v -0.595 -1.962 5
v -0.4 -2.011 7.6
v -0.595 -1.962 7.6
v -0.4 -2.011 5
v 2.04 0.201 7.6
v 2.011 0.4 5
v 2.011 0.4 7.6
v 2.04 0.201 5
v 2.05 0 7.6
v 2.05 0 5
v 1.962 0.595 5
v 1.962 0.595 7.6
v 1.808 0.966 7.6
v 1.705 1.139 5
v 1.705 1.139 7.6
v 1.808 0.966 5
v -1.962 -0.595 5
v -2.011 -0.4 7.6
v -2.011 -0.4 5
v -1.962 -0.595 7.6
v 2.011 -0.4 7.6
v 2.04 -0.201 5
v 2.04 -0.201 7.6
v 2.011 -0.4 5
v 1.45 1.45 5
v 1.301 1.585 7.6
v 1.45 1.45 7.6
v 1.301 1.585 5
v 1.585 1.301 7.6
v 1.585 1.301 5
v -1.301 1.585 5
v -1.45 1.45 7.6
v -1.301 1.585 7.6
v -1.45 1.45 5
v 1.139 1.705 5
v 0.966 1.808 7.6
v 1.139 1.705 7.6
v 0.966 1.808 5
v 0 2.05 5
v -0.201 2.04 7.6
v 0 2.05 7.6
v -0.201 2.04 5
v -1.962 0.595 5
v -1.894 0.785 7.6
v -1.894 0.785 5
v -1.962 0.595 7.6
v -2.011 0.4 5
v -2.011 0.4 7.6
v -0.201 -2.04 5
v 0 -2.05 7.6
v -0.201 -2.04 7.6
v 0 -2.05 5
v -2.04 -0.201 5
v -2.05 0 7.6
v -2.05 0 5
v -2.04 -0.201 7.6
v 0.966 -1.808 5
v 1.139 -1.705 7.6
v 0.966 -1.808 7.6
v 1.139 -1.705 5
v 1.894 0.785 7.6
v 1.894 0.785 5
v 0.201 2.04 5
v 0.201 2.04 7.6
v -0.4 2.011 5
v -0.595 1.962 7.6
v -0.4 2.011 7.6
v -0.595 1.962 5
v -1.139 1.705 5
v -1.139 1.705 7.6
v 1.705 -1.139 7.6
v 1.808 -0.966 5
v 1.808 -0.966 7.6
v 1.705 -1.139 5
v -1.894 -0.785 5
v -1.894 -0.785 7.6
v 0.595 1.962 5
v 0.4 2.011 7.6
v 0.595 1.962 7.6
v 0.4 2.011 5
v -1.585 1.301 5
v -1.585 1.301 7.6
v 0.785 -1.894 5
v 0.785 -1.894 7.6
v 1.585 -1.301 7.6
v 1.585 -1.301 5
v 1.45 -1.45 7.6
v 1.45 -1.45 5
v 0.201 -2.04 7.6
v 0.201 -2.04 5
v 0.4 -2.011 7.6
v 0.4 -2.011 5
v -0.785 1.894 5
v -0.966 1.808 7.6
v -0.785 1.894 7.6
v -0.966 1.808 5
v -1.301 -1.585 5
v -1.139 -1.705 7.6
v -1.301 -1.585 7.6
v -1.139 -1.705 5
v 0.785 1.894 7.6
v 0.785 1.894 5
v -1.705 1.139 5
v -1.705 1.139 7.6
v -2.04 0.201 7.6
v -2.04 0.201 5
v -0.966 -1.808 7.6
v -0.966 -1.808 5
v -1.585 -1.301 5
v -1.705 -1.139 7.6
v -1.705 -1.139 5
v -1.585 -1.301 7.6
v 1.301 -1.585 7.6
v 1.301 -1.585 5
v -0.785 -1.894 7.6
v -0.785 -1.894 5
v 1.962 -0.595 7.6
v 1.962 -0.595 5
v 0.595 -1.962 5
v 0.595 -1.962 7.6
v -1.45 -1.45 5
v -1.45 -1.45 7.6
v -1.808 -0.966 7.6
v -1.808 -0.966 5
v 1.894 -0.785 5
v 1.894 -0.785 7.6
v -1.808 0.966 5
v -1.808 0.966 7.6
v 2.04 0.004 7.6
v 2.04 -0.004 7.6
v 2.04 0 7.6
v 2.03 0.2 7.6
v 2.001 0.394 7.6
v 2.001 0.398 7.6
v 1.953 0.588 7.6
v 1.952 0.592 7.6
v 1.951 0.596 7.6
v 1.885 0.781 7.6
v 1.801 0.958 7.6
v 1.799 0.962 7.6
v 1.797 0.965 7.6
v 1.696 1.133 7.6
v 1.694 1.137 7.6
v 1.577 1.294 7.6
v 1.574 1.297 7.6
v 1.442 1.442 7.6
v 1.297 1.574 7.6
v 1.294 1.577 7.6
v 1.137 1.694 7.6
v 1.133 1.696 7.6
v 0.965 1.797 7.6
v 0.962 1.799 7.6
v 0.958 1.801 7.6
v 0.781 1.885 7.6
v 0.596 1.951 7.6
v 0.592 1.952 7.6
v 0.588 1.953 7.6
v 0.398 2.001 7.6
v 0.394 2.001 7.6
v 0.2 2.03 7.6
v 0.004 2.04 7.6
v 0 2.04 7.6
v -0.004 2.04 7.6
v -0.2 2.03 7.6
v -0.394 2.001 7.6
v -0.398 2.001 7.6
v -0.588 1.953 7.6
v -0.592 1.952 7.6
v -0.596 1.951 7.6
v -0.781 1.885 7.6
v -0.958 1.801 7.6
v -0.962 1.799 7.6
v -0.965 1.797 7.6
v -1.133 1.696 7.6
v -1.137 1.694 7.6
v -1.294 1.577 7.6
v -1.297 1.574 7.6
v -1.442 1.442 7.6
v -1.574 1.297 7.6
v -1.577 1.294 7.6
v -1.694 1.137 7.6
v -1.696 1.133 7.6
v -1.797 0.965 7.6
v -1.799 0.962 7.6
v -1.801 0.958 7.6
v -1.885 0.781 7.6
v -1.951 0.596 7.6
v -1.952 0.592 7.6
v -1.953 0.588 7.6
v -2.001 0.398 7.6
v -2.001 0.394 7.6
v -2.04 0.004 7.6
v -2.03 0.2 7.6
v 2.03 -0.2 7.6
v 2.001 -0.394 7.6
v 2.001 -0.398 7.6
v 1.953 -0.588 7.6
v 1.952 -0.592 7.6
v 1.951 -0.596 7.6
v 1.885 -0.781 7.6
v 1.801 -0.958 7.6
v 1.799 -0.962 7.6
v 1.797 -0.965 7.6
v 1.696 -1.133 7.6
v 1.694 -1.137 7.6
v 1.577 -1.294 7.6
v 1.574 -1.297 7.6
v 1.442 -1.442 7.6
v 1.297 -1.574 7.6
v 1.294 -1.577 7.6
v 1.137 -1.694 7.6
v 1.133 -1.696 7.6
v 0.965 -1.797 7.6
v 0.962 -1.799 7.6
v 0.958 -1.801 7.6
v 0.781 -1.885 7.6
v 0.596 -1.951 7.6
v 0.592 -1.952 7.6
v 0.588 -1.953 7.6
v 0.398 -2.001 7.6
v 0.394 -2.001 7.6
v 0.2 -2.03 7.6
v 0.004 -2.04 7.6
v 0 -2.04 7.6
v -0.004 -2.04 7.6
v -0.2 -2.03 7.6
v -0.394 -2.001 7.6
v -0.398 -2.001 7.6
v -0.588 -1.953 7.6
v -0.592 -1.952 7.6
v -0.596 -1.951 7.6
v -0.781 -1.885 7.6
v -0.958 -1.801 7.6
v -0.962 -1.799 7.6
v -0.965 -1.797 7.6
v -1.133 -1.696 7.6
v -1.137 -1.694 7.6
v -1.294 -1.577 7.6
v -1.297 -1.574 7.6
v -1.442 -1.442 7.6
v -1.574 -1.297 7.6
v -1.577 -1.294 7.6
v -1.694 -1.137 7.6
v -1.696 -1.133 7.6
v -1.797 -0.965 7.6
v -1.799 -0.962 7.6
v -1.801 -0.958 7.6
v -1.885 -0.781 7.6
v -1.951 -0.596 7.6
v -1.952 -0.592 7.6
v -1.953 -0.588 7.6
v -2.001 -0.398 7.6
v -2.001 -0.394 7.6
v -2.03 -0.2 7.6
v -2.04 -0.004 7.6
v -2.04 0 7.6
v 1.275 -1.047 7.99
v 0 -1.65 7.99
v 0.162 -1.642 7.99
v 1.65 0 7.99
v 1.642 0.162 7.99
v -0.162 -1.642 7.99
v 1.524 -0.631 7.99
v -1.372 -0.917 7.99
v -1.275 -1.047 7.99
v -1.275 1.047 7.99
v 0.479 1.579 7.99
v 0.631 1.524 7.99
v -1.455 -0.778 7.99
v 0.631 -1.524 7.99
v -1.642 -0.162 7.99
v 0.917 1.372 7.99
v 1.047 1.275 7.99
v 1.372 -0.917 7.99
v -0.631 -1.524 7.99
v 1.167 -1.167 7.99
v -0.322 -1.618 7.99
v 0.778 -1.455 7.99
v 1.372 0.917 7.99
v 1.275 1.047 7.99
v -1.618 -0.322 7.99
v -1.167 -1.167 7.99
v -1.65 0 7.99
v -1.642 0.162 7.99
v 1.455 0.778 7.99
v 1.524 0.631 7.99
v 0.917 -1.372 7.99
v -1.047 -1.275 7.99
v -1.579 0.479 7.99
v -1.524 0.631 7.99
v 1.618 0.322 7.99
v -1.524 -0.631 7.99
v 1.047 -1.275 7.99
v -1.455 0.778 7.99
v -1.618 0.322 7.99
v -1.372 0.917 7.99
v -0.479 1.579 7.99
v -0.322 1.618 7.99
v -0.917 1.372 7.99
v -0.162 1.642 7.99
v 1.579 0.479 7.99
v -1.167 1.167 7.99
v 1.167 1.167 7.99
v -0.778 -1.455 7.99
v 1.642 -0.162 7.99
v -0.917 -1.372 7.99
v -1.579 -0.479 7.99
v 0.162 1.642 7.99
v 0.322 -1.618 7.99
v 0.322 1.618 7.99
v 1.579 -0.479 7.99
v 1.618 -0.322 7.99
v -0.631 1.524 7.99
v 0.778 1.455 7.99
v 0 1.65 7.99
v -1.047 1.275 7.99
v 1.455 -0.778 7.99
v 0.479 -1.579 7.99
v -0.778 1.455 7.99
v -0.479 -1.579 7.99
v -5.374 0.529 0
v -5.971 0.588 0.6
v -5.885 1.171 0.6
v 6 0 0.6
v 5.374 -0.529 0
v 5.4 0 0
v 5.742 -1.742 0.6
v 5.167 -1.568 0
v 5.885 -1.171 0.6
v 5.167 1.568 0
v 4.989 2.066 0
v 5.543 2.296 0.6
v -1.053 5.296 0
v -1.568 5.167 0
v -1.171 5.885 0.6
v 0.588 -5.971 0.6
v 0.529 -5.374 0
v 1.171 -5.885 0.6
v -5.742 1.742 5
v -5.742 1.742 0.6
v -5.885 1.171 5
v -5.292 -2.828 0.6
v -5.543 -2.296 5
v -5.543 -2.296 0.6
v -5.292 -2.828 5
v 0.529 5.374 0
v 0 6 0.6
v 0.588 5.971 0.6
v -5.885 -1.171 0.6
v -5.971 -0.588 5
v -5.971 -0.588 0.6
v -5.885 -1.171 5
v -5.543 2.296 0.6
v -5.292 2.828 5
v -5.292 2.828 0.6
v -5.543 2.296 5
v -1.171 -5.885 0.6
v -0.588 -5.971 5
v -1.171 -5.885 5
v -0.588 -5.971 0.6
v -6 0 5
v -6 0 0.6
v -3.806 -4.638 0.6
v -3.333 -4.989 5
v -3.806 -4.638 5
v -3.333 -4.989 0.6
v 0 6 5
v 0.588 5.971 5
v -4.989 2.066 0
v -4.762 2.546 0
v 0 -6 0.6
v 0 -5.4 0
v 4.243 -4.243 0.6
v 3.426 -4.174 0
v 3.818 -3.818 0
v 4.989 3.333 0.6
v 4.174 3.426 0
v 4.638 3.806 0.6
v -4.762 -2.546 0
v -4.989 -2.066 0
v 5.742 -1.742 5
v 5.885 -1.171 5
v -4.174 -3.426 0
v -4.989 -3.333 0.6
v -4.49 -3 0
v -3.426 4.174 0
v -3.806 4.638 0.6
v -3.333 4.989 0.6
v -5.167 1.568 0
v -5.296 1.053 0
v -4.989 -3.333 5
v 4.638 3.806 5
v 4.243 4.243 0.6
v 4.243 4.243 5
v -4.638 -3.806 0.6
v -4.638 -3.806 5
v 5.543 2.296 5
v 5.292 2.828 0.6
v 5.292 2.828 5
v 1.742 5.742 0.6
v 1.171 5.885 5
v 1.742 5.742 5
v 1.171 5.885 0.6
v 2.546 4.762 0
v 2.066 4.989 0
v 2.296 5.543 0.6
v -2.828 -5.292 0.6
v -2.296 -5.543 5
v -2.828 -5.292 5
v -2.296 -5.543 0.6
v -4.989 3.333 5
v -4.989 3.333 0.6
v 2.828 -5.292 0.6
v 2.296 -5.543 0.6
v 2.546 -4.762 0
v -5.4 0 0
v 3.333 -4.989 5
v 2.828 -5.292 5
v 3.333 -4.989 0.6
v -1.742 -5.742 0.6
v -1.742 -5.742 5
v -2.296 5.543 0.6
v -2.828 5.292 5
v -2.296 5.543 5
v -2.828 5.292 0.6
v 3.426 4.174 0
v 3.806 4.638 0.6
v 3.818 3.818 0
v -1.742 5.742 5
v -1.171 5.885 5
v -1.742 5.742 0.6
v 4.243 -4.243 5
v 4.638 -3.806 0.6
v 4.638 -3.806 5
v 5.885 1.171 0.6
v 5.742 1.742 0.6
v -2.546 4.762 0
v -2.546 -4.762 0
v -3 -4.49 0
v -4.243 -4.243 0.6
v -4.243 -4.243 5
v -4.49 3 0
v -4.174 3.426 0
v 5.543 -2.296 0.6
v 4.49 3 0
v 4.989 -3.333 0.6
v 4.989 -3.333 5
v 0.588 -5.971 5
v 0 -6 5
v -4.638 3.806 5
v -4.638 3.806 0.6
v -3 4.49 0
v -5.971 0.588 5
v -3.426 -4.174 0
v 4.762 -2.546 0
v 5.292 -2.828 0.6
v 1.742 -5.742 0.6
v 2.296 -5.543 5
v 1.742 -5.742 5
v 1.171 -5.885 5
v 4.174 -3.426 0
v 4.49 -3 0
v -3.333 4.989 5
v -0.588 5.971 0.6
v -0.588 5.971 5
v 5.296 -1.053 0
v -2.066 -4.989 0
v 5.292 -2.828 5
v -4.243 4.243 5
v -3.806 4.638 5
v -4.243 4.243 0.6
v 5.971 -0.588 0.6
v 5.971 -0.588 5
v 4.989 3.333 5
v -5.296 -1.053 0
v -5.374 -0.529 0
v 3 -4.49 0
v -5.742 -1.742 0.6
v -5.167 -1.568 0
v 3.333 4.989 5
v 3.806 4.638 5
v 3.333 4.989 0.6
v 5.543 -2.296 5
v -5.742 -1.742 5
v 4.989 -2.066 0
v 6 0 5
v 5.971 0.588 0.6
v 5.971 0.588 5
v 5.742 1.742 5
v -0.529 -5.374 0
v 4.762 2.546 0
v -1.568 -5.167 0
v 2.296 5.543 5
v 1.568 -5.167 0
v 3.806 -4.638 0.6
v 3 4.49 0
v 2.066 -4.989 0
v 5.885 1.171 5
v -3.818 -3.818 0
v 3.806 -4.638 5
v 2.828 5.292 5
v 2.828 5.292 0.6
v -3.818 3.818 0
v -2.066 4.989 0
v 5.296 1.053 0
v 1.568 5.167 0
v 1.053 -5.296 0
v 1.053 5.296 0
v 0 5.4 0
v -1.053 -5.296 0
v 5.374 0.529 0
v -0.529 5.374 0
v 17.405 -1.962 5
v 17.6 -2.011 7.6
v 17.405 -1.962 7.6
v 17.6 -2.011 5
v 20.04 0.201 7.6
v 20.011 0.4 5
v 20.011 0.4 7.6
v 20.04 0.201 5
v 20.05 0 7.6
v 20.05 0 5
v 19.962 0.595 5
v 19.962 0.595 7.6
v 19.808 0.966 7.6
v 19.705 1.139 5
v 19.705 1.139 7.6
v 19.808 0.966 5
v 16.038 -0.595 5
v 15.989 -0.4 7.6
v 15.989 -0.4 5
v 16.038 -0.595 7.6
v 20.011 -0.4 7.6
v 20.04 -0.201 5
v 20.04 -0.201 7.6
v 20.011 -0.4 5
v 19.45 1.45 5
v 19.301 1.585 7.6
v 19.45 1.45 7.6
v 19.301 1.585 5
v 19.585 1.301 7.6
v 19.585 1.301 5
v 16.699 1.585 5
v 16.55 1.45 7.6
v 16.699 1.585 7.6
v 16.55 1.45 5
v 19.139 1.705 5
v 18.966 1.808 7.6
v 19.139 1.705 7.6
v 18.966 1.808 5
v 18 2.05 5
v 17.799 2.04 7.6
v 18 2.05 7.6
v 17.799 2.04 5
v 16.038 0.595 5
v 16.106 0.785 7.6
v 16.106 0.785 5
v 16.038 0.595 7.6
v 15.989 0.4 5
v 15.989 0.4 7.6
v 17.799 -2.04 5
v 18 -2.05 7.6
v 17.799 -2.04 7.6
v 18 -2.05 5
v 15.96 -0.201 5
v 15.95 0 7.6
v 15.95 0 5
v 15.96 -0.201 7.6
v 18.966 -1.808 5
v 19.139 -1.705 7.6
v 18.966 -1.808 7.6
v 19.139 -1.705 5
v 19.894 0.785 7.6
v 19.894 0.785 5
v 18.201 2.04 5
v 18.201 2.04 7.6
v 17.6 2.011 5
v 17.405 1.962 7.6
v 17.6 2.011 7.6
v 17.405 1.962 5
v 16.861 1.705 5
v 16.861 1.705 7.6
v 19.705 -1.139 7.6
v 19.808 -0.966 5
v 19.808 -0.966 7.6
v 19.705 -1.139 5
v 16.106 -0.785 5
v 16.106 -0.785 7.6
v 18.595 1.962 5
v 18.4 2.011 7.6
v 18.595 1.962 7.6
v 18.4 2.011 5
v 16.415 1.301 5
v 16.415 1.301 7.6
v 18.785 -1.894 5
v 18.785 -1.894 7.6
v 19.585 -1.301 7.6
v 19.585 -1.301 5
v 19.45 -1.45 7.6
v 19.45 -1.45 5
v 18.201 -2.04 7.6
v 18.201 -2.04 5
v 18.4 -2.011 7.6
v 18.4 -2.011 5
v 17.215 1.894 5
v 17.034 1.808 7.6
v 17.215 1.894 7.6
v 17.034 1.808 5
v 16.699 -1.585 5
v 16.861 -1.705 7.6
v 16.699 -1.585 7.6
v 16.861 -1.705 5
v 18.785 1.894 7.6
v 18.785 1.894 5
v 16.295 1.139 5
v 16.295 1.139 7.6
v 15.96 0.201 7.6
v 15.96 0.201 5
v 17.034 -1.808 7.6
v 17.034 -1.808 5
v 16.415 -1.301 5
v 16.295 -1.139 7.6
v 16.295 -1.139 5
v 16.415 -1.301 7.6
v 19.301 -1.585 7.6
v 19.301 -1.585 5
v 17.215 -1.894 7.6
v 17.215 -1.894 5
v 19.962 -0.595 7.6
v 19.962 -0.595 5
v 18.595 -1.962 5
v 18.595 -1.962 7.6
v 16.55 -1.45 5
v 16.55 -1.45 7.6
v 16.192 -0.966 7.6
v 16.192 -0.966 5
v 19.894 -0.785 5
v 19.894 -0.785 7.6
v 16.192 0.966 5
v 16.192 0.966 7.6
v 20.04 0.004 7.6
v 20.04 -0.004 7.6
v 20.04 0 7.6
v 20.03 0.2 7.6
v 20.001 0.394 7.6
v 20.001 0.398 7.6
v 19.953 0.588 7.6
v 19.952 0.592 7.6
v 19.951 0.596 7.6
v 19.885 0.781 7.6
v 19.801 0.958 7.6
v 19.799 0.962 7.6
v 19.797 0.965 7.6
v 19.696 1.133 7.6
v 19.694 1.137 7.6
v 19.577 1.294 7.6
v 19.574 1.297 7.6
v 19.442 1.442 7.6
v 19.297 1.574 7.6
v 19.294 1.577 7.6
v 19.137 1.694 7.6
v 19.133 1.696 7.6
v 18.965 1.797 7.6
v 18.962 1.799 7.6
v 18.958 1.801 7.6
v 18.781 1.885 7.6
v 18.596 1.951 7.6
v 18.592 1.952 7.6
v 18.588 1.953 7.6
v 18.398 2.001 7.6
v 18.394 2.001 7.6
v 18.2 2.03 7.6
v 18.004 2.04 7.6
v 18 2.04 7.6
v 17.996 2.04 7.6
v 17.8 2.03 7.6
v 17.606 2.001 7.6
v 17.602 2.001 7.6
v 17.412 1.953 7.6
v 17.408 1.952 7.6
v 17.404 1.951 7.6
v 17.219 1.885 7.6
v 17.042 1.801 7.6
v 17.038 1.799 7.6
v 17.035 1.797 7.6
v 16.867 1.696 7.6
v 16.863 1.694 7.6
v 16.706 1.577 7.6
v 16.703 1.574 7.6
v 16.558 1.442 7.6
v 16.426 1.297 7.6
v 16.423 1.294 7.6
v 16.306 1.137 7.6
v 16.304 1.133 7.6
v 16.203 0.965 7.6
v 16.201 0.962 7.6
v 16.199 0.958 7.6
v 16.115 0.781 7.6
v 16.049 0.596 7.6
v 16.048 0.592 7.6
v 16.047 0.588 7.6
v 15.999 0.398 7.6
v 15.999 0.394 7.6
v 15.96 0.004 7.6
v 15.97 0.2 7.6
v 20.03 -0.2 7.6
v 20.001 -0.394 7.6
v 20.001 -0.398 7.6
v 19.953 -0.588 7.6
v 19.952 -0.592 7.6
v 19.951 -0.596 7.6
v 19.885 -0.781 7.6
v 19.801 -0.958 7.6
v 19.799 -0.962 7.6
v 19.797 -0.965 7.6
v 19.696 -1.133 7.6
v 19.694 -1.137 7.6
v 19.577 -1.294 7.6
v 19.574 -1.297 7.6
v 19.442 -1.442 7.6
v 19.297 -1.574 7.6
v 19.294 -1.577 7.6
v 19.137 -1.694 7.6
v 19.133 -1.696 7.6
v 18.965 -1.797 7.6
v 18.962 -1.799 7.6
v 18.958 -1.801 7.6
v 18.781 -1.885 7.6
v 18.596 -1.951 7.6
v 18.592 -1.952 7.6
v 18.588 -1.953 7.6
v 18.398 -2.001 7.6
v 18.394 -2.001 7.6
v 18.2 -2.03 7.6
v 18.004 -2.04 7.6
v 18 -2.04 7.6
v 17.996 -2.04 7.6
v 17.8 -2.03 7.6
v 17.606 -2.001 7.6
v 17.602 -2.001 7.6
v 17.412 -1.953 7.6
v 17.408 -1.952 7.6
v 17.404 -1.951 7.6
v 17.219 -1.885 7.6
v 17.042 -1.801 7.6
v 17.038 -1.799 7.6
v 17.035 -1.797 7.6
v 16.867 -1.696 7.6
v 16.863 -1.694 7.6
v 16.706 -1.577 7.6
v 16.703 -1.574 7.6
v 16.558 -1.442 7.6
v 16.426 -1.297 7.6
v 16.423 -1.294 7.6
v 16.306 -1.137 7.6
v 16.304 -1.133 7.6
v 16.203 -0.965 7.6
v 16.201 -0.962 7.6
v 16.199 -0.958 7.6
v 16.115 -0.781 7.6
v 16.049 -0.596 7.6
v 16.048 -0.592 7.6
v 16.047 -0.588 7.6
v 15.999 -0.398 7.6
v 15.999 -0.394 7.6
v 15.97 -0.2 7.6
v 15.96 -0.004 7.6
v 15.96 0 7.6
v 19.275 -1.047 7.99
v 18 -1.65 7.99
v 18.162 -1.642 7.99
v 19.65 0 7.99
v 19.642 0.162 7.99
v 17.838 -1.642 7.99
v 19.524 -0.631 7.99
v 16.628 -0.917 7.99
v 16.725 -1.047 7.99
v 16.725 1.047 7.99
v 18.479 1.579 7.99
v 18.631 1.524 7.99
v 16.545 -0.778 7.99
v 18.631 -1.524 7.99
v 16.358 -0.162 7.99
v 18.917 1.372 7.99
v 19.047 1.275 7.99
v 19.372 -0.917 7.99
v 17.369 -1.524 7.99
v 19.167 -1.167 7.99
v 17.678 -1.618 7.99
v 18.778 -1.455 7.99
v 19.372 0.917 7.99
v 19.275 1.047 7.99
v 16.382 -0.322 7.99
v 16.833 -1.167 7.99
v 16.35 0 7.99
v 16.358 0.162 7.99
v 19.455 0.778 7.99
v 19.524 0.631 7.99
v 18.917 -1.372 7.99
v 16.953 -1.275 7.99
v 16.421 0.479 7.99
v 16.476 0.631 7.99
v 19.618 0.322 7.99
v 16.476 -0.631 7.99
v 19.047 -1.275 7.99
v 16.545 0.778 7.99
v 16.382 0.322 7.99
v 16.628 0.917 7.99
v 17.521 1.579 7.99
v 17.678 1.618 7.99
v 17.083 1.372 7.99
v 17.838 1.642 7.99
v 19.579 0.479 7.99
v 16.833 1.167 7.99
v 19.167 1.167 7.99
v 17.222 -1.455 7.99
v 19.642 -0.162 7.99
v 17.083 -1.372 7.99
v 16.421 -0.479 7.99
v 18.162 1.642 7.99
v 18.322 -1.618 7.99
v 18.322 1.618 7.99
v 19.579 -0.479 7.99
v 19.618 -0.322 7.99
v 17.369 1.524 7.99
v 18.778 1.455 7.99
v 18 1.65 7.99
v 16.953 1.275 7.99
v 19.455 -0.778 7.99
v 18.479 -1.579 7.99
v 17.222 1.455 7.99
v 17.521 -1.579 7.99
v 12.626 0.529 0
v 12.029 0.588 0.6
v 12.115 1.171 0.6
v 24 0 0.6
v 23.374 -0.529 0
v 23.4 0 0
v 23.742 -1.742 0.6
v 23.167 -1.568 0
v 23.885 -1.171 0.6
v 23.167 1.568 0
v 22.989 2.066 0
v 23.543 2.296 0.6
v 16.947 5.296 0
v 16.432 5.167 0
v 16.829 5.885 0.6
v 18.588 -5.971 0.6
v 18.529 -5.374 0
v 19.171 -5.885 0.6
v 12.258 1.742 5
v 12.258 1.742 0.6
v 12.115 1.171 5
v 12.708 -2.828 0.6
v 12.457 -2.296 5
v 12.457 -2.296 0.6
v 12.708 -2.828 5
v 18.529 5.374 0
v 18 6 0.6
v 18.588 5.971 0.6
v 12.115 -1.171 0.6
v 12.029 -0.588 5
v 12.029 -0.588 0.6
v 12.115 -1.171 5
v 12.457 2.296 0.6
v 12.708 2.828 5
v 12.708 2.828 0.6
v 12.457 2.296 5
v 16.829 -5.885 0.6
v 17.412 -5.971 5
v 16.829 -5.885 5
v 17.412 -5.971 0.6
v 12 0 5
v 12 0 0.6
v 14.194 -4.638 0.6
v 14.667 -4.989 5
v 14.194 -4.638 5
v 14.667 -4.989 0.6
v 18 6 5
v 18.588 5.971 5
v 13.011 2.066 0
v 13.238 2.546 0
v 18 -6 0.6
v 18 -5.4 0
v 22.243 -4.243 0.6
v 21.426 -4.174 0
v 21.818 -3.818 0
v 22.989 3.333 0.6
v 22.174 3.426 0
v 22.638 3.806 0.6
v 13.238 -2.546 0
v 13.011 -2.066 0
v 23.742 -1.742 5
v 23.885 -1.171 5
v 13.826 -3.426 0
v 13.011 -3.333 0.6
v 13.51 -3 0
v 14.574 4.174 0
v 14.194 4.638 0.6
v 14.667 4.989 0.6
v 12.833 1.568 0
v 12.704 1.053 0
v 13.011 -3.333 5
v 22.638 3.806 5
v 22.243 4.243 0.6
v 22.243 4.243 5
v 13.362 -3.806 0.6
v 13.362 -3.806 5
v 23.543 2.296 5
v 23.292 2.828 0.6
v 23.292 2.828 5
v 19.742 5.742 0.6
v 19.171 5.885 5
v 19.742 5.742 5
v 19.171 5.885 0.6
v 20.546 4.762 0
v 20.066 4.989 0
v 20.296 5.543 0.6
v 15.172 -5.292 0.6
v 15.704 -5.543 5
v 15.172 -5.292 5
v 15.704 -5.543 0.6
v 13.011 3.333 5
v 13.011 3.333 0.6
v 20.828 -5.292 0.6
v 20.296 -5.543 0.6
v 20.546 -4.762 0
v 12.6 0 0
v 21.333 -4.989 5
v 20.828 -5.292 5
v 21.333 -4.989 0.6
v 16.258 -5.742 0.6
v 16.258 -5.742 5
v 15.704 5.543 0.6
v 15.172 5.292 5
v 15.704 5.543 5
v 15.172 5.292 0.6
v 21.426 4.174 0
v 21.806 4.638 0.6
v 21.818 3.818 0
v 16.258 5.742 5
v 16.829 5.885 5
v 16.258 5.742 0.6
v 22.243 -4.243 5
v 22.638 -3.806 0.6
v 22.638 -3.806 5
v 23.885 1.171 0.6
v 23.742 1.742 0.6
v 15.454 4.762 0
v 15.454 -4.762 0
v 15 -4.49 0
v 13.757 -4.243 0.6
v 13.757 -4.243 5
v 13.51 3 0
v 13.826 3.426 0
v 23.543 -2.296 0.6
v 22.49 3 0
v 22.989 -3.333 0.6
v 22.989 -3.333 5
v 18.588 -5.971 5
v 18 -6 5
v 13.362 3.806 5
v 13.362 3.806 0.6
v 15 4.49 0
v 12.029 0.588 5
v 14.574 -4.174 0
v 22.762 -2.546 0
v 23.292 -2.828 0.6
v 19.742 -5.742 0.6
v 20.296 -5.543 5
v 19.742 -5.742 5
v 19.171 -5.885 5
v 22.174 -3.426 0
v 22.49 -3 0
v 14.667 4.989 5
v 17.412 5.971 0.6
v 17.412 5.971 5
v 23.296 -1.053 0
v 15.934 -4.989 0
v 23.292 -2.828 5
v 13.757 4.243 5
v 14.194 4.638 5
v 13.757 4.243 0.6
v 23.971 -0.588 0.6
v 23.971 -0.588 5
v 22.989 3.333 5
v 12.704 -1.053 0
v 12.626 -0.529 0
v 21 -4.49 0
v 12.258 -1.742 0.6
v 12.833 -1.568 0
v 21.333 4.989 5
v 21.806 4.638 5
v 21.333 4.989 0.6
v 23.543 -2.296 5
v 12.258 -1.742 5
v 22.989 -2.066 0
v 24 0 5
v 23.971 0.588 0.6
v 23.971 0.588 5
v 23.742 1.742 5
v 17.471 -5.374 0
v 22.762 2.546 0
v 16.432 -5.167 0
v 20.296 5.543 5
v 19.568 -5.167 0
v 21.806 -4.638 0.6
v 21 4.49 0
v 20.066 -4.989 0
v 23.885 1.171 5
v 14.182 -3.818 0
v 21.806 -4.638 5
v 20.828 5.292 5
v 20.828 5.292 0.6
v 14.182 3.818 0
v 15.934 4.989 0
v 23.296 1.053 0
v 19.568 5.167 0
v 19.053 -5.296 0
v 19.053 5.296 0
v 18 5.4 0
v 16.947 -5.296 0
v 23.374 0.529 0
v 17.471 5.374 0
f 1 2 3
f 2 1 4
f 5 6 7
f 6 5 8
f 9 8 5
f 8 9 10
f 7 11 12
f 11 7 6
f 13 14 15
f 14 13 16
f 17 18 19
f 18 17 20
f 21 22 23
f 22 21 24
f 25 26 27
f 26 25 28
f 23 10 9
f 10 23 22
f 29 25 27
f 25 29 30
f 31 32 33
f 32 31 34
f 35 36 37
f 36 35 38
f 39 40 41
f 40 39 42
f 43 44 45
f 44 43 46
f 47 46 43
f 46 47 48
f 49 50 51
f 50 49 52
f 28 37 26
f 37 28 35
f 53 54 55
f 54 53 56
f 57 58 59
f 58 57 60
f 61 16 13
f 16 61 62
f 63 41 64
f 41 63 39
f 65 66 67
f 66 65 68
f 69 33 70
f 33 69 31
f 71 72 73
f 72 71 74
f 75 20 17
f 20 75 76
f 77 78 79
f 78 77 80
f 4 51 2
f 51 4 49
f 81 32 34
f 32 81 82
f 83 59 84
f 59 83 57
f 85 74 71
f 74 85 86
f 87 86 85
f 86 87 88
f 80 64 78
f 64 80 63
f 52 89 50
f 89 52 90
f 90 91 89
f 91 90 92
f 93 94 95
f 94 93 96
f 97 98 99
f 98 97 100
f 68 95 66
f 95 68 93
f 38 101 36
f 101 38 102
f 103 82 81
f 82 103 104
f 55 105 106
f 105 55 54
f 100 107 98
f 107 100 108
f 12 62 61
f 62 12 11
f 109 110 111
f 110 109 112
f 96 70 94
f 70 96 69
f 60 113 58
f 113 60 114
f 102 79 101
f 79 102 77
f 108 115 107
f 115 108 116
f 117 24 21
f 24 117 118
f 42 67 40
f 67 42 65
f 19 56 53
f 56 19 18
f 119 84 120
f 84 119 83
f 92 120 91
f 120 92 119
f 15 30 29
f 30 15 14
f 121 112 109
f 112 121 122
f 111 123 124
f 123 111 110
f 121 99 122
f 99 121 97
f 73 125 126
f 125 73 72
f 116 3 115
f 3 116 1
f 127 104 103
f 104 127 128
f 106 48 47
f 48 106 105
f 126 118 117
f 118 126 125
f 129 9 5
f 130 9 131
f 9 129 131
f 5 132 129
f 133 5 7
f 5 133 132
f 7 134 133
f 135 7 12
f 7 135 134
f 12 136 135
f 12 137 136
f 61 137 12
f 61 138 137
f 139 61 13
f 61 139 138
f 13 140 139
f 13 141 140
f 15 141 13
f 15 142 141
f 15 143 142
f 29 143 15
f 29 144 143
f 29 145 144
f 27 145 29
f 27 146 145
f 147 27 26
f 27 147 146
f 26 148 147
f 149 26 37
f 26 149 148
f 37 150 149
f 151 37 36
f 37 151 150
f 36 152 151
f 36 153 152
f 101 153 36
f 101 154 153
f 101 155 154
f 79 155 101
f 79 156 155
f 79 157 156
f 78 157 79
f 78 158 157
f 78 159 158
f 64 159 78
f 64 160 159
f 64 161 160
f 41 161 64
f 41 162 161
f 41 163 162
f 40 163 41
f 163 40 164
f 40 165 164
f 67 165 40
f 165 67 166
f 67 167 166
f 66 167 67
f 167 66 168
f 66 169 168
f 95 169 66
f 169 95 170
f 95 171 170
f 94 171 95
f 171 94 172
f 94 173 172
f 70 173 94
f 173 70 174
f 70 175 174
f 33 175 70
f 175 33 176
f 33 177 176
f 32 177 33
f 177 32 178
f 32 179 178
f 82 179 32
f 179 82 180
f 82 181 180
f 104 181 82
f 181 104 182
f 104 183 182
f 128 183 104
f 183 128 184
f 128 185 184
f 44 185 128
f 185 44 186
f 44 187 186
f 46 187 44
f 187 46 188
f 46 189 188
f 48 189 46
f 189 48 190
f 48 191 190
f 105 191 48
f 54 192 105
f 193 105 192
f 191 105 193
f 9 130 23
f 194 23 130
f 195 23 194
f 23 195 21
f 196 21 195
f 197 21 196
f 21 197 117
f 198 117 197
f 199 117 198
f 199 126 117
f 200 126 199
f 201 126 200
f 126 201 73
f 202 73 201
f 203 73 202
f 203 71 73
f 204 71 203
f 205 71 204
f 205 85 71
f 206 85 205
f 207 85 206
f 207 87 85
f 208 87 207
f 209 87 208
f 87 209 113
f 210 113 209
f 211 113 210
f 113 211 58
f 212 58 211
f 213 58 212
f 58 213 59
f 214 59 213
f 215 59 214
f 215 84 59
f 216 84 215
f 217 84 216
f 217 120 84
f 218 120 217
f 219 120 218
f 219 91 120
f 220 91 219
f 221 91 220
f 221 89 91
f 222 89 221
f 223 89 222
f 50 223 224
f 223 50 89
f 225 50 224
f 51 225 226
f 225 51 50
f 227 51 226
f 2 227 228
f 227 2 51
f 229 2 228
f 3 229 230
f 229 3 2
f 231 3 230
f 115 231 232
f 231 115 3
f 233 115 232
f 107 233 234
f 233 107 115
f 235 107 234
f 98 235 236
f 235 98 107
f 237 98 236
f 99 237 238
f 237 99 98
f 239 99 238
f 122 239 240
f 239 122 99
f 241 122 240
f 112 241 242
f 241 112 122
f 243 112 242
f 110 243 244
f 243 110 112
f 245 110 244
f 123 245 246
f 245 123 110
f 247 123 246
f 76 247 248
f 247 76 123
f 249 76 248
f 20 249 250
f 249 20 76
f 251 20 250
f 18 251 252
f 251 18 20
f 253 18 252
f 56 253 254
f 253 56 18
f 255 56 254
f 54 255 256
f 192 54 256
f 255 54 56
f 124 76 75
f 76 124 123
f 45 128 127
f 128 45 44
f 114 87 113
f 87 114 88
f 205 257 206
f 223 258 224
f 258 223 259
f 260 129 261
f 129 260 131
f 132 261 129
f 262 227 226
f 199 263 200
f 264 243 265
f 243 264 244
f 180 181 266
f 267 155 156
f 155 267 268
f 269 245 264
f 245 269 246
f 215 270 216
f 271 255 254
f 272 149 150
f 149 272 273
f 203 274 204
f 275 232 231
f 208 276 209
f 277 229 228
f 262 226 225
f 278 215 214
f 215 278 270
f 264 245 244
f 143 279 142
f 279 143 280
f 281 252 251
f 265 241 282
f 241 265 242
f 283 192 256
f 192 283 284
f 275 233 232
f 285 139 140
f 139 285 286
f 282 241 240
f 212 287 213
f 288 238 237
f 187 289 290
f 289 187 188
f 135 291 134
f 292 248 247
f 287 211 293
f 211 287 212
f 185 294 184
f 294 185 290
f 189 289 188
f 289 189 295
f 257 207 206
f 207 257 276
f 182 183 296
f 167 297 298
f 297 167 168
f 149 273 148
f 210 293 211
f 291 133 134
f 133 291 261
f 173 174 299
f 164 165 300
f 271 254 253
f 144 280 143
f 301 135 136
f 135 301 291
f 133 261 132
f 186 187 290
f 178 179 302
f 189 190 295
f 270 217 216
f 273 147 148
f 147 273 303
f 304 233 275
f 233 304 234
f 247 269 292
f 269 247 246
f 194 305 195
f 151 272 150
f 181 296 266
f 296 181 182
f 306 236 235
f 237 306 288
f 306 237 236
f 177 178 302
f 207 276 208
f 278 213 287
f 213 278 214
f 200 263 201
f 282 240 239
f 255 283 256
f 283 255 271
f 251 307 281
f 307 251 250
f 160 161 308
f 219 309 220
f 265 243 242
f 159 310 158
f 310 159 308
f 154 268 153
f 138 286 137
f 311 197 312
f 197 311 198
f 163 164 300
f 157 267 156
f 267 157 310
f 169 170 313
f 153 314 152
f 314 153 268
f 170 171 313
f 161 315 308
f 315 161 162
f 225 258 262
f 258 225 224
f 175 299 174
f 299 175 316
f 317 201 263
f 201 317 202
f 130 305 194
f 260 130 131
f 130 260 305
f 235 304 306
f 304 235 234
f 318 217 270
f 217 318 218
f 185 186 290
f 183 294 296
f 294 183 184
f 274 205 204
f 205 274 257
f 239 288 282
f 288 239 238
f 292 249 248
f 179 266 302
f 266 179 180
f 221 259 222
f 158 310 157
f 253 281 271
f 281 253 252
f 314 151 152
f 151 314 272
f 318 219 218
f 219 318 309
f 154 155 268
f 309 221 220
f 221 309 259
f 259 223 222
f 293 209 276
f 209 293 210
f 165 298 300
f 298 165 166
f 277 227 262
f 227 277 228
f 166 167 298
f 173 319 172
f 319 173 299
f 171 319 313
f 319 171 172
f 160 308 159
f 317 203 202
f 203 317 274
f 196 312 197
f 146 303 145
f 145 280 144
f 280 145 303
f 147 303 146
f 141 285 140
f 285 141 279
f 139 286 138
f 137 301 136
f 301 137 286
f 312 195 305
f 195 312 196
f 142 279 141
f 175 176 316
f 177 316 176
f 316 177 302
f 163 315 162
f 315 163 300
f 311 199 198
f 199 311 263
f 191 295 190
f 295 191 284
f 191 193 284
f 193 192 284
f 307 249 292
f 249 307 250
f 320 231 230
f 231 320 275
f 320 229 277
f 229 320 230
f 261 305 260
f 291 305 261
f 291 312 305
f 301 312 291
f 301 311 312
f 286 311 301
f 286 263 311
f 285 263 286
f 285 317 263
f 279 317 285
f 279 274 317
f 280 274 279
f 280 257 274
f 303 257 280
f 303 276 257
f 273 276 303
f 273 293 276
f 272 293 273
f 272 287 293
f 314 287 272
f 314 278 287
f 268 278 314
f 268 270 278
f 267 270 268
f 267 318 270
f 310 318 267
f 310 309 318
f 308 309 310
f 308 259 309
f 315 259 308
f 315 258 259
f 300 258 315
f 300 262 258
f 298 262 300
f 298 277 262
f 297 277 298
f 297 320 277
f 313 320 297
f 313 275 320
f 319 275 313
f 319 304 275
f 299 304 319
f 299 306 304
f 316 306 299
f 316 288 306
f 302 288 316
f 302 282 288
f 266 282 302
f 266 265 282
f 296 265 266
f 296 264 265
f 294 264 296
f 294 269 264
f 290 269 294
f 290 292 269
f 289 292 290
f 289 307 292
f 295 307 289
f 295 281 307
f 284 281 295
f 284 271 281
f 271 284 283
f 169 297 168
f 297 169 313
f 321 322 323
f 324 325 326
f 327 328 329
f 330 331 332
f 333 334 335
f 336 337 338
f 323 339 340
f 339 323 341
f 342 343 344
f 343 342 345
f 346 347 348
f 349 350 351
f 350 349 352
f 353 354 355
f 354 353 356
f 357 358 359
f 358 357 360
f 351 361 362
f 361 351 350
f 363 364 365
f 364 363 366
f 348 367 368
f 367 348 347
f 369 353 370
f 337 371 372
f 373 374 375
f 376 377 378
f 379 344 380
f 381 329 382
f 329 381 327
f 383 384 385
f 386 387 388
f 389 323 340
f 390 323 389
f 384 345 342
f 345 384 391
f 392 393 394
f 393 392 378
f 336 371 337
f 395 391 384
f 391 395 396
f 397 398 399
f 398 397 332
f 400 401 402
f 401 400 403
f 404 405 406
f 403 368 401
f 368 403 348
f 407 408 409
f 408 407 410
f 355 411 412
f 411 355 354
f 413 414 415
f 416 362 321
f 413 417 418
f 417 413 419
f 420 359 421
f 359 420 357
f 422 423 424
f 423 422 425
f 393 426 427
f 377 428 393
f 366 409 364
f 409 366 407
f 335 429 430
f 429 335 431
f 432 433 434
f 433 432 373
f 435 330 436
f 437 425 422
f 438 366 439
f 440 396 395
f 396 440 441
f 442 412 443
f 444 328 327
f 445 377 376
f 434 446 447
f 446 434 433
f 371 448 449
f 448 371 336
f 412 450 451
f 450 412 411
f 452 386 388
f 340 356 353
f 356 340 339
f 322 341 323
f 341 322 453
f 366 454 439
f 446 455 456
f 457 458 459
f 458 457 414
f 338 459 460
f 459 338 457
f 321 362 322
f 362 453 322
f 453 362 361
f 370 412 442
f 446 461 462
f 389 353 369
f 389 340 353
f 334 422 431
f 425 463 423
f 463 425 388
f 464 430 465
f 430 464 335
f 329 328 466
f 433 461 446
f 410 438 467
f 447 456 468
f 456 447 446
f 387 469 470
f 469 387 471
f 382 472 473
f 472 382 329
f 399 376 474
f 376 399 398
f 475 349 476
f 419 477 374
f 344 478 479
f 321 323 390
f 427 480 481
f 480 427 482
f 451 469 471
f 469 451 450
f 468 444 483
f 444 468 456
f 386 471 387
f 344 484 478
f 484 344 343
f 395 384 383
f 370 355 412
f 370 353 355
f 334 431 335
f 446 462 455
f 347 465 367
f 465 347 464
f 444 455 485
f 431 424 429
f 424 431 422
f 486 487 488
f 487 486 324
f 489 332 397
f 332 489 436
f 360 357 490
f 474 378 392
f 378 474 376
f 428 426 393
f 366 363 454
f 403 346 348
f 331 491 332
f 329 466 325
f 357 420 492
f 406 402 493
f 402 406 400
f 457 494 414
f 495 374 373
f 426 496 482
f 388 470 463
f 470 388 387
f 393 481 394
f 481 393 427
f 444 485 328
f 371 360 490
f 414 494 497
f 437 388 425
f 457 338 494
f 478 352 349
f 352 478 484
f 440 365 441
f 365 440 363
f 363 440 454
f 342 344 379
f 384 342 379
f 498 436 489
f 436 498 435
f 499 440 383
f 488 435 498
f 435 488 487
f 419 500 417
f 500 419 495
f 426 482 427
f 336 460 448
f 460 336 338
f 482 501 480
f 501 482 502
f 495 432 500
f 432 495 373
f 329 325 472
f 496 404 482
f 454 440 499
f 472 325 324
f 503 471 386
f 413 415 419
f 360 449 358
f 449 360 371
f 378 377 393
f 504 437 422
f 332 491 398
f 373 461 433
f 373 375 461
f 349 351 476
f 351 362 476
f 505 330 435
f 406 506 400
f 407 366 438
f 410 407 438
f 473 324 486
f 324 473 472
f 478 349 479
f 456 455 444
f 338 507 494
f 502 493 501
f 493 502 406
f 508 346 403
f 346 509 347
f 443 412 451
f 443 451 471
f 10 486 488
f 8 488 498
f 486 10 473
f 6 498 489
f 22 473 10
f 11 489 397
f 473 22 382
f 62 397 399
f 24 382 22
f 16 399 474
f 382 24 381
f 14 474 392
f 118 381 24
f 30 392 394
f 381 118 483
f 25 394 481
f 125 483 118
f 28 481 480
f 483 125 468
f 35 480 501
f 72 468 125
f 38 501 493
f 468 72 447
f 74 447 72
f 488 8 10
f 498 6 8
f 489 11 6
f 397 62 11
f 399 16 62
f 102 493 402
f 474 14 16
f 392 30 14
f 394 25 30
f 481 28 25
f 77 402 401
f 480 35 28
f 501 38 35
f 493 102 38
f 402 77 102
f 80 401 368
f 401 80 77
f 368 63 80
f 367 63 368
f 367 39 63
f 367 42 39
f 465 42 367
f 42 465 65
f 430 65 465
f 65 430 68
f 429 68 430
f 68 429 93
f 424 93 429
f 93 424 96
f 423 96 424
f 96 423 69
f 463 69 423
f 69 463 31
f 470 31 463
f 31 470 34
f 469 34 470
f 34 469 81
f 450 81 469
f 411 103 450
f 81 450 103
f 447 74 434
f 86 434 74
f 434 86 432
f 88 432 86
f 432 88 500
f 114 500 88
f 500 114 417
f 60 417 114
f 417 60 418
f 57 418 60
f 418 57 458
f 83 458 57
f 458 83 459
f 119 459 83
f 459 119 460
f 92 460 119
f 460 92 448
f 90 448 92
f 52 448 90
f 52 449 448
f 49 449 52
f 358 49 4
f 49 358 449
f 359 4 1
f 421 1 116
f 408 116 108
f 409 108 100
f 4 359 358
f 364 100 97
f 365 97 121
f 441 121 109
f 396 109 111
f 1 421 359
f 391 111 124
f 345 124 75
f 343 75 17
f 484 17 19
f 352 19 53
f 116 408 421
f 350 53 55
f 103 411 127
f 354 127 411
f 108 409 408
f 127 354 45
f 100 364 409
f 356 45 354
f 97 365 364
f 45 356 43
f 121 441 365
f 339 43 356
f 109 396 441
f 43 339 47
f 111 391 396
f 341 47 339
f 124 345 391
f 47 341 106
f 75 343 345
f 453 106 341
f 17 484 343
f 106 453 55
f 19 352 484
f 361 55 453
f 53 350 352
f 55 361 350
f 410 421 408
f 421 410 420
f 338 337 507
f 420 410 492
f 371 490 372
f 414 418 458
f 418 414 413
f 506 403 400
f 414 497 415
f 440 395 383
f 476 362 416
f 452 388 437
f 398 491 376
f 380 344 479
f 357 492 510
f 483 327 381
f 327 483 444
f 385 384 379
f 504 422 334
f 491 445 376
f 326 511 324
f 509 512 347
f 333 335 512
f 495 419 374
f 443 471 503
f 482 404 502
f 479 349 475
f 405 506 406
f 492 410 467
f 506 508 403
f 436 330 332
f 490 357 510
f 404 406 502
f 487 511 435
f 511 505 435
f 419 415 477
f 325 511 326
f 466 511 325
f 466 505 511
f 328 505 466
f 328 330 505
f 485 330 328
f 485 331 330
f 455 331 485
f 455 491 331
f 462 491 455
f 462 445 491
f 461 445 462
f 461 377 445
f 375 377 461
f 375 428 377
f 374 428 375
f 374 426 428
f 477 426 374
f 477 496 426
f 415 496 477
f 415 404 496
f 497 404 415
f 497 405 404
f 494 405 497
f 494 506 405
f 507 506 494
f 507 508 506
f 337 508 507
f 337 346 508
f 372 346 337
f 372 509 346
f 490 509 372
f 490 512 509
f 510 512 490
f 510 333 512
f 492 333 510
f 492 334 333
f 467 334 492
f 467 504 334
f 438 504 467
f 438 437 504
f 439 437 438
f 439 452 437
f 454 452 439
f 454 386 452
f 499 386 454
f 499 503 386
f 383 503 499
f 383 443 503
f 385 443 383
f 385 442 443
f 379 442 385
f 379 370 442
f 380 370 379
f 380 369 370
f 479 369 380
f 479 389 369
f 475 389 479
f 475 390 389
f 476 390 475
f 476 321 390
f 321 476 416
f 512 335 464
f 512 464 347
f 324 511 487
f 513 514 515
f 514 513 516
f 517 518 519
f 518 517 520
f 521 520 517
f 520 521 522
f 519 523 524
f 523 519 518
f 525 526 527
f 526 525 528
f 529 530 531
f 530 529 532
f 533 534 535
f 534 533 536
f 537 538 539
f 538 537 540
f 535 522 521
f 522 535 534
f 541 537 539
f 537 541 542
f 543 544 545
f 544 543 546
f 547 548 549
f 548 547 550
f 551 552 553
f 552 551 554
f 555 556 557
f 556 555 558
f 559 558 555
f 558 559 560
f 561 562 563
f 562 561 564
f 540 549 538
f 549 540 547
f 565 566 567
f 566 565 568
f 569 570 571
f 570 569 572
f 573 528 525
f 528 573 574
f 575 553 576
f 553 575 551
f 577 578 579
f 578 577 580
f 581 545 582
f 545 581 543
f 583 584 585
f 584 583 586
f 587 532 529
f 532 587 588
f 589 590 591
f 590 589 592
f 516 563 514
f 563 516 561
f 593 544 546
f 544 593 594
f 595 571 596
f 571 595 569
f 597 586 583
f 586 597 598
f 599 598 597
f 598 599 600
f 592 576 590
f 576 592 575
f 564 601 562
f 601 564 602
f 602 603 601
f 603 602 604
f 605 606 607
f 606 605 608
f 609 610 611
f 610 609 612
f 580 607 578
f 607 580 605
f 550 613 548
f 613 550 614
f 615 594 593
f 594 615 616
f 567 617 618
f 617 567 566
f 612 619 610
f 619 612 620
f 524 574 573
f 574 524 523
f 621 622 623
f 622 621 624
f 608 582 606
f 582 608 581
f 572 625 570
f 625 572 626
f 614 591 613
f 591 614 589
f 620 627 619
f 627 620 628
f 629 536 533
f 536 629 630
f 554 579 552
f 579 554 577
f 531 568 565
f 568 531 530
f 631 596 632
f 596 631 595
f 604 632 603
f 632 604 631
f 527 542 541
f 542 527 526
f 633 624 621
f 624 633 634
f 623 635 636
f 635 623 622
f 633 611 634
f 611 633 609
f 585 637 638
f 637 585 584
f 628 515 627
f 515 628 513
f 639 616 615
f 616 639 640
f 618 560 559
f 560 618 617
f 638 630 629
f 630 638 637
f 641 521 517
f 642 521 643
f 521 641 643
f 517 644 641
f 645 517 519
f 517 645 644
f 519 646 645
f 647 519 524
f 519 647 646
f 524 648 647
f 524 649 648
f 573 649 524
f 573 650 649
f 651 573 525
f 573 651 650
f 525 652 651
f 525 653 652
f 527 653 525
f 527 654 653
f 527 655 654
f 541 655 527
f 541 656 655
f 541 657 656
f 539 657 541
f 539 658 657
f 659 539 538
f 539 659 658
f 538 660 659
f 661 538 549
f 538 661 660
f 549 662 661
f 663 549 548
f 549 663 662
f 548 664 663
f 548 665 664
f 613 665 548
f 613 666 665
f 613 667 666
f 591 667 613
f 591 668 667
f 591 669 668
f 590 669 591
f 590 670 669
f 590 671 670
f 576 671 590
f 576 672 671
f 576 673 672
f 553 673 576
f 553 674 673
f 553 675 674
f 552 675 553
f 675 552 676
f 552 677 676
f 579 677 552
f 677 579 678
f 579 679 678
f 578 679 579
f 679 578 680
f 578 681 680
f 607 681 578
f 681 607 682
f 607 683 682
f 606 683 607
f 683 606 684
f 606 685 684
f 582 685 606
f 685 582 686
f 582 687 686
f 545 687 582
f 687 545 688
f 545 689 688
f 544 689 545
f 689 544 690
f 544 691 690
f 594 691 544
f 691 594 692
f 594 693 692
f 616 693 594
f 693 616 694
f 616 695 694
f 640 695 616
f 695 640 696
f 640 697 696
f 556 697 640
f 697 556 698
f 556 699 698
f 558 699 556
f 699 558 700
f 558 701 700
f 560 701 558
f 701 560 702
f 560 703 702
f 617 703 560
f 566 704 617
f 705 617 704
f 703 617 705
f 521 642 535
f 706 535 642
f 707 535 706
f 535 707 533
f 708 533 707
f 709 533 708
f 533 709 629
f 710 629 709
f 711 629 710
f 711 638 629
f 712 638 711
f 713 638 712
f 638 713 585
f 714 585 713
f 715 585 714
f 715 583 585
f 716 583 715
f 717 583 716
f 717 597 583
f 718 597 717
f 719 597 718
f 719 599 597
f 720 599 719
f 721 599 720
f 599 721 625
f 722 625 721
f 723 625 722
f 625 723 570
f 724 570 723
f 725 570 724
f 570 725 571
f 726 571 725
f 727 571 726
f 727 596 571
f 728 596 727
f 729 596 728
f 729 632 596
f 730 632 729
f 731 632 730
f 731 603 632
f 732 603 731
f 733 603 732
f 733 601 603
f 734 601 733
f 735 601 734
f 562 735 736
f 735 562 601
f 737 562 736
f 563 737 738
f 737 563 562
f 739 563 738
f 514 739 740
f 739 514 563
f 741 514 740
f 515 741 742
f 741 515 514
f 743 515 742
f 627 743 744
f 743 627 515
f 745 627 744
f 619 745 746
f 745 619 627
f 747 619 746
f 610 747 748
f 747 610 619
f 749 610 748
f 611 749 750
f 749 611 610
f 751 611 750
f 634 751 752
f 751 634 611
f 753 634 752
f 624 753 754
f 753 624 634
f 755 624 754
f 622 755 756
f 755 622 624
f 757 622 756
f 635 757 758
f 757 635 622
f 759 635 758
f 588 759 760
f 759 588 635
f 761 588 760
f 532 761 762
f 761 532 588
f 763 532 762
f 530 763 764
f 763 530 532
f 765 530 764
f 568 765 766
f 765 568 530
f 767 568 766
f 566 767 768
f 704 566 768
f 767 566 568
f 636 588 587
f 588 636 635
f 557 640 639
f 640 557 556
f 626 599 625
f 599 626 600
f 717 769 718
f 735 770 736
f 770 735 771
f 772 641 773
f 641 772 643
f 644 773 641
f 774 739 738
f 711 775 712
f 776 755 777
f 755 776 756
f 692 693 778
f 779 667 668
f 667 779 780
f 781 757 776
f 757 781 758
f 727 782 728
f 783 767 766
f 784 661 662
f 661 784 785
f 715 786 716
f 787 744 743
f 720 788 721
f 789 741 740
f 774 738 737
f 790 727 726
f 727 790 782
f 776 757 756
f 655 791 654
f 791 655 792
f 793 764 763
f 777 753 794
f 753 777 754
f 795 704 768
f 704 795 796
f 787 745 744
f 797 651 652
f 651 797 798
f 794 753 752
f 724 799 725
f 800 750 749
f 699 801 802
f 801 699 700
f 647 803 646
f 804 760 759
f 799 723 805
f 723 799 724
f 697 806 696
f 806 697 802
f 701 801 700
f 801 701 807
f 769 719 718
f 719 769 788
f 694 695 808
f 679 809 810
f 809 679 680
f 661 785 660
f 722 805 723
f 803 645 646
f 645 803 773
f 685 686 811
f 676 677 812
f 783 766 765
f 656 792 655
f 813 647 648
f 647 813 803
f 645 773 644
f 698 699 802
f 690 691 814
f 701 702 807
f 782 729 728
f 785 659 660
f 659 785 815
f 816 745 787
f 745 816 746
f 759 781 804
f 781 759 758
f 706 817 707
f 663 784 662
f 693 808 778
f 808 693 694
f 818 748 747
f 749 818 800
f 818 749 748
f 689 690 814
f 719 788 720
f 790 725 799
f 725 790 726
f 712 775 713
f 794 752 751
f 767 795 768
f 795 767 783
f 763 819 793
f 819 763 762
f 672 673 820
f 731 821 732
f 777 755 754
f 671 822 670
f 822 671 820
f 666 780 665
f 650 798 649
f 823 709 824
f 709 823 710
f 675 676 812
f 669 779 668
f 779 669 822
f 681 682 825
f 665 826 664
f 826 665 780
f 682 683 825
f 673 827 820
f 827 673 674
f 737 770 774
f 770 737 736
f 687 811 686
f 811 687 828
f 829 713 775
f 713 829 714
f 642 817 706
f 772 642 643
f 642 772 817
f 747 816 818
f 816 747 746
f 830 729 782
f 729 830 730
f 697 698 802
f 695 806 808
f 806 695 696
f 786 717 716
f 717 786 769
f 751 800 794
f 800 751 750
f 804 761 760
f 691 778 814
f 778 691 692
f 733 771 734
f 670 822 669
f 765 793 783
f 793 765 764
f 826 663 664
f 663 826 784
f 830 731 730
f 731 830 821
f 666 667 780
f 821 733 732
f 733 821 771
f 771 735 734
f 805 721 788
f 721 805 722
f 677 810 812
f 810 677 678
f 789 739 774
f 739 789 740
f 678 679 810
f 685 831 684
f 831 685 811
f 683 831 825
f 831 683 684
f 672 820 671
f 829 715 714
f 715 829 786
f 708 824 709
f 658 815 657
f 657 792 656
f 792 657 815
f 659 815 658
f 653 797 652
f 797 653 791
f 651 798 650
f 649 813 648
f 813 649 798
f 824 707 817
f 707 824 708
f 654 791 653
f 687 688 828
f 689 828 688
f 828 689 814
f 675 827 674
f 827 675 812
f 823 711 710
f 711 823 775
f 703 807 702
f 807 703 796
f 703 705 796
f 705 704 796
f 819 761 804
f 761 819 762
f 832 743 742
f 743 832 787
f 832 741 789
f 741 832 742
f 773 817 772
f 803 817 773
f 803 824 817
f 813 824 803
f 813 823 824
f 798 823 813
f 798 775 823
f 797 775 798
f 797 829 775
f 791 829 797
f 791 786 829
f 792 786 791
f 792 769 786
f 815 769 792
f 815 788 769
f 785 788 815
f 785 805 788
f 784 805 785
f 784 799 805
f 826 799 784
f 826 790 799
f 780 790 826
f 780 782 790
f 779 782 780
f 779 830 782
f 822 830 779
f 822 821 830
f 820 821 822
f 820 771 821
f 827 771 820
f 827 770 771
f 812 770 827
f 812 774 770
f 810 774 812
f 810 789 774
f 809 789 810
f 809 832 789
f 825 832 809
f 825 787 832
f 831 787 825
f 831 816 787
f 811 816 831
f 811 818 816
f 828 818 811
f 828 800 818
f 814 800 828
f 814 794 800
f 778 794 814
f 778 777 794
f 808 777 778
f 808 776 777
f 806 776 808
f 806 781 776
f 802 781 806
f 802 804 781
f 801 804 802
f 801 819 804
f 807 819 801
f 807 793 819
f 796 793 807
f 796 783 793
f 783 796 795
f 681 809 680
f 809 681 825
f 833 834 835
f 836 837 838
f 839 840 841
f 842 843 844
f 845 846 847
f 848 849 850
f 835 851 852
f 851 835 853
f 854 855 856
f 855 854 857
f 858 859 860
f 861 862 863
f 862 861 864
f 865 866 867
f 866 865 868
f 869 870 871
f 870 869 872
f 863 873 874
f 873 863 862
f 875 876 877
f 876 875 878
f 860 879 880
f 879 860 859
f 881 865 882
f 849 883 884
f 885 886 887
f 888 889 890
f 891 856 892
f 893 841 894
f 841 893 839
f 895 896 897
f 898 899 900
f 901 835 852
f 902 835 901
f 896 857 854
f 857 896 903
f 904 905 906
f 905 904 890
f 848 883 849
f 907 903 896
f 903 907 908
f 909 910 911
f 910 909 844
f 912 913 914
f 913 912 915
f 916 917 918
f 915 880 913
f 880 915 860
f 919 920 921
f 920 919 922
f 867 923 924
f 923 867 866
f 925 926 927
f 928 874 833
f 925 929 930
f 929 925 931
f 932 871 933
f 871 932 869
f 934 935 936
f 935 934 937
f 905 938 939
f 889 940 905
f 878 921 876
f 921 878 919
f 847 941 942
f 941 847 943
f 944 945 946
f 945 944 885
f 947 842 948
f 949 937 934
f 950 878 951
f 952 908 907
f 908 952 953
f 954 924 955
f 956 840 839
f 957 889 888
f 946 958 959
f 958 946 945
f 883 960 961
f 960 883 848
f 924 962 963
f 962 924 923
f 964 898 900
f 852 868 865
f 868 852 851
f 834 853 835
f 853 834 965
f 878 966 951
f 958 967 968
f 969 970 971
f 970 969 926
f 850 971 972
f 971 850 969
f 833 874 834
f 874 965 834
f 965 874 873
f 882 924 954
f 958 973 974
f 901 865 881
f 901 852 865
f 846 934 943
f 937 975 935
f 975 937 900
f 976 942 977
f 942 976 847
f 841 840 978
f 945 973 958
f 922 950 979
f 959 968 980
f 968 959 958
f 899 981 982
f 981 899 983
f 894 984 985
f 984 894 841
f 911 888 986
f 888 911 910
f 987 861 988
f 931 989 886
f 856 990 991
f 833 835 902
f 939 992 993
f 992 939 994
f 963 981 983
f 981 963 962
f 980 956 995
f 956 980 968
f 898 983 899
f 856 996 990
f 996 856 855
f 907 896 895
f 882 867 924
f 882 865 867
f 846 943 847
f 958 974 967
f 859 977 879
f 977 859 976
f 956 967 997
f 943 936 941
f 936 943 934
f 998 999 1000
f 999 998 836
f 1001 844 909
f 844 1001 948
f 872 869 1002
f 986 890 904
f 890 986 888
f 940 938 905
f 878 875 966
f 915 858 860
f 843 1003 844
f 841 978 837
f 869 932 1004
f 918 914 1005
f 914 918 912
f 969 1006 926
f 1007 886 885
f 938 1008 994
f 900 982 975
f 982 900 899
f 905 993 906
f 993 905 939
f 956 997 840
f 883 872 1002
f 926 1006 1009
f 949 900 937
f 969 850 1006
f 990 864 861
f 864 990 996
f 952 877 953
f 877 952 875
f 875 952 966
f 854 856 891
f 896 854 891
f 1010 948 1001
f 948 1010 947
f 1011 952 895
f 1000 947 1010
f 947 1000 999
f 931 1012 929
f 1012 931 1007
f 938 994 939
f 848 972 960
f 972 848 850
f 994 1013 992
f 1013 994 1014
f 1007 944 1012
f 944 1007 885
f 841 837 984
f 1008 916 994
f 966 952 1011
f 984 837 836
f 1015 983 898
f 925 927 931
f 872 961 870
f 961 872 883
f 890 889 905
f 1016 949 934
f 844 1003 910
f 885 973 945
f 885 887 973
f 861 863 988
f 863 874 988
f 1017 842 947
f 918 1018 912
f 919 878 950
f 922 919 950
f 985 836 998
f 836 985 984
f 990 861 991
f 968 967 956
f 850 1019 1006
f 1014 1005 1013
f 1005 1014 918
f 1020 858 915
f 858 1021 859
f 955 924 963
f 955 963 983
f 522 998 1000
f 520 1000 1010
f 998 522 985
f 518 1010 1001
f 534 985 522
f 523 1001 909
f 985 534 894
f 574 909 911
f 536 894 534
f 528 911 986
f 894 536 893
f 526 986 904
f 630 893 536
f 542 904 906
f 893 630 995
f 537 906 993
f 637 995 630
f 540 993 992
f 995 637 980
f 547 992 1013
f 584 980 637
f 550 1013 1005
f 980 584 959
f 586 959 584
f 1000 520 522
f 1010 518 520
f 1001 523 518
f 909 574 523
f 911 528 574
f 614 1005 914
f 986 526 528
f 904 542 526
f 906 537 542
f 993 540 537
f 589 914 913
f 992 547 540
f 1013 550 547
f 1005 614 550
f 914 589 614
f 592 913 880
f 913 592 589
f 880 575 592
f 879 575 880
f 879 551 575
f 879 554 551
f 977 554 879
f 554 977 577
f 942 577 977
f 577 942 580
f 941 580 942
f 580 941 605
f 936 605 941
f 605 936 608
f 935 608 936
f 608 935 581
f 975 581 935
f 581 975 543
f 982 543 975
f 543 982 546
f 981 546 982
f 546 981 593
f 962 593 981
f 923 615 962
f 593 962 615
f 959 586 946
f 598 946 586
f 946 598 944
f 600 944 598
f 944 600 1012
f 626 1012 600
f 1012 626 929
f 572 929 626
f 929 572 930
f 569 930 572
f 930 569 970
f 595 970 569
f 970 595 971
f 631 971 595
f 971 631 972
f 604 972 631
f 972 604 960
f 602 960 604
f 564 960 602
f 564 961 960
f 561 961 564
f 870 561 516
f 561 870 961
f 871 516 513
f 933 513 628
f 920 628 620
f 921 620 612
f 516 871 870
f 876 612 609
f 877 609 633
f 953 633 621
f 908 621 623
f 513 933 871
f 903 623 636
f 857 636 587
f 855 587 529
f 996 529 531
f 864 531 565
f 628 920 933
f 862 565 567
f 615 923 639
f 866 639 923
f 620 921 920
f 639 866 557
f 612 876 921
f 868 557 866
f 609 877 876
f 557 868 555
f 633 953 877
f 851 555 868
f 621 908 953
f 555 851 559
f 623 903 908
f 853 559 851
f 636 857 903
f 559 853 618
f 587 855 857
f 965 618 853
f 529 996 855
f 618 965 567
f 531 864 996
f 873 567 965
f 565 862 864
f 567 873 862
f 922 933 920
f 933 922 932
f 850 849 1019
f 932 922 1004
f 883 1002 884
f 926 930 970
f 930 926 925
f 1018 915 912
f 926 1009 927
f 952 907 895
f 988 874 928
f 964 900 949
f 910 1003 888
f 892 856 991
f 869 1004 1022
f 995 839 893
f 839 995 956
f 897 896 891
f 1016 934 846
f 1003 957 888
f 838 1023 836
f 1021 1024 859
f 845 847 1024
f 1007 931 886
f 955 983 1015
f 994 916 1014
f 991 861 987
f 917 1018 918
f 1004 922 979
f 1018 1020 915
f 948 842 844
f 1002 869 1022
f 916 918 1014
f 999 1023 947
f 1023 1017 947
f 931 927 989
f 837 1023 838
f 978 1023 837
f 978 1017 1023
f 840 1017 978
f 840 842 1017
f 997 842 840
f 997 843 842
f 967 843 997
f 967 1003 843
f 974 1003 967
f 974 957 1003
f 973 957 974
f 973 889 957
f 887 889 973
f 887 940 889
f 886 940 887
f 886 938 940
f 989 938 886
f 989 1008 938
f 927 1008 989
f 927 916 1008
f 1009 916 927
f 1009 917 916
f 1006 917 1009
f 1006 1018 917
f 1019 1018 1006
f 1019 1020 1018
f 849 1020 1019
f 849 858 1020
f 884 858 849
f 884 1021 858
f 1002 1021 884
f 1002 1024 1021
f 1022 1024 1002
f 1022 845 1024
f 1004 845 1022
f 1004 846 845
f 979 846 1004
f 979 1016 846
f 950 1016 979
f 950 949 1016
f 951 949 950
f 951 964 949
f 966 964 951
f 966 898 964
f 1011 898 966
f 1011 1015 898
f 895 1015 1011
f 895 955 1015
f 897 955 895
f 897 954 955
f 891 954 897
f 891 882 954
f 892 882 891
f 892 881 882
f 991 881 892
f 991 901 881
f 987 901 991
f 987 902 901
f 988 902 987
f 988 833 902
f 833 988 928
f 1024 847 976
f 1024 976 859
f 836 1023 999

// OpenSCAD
// file: helping_hands_feet_common.scad
// helping_hands_feet_common — pegged TPU 95A replacement feet for a helping-hands
// plate that arrived with a foot missing. The stock feet are glued over two holes;
// these press into the holes instead.
//
// MEASURED / TESTED (survey/MEASUREMENTS.md):
//   hole           3.83 mm (calipers, 2026-10-26)
//   peg            4.1 mm — the 4-dot peg on coupons/peg_fit_coupon.scad pressed in
//                  best (TPU squeezes in over the hole and grips), 2026-10-27
//   peg length     3 mm — "perfect" on the coupon
//   foot           5 mm tall (user); pad ⌀12 kept from the coupon (assumed)
//   count          2 — the plate has two holes
//
// PRINT: in TPU 95A, pads down, pegs up, as emitted. No supports.
//
// SPDX-License-Identifier: CC-BY-NC-4.0
// Copyright (c) 2026 Aaron Cupp

PEG_D    = 4.1;
PEG_L    = 3.0;
PEG_CHAM = 0.4;
FOOT_H   = 5.0;
FOOT_D   = 12.0;
FOOT_CHAM = 0.6;   // softens the bottom edge so it doesn't curl or catch
N_FEET   = 2;
GAP      = 6;      // between feet on the bed

$fn = 64;

module foot() {
    // pad: a turned profile with a small chamfer on the bottom edge
    rotate_extrude() polygon([[0, 0], [FOOT_D/2 - FOOT_CHAM, 0], [FOOT_D/2, FOOT_CHAM],
                              [FOOT_D/2, FOOT_H], [0, FOOT_H]]);
    // peg: a PARTIAL-area join onto the pad's top, so it overlaps rather than butts
    translate([0, 0, FOOT_H - 0.4]) {
        cylinder(d = PEG_D, h = PEG_L - PEG_CHAM + 0.4);
        translate([0, 0, PEG_L - PEG_CHAM + 0.4 - 0.01])
            cylinder(d1 = PEG_D, d2 = PEG_D - 2*PEG_CHAM, h = PEG_CHAM);
    }
}

module feet() { for (i = [0:N_FEET-1]) translate([i * (FOOT_D + GAP), 0, 0]) foot(); }
// main file
// helping_hands_feet — print in TPU 95A. See helping_hands_feet_common.scad.
include <helping_hands_feet_common.scad>
feet();
